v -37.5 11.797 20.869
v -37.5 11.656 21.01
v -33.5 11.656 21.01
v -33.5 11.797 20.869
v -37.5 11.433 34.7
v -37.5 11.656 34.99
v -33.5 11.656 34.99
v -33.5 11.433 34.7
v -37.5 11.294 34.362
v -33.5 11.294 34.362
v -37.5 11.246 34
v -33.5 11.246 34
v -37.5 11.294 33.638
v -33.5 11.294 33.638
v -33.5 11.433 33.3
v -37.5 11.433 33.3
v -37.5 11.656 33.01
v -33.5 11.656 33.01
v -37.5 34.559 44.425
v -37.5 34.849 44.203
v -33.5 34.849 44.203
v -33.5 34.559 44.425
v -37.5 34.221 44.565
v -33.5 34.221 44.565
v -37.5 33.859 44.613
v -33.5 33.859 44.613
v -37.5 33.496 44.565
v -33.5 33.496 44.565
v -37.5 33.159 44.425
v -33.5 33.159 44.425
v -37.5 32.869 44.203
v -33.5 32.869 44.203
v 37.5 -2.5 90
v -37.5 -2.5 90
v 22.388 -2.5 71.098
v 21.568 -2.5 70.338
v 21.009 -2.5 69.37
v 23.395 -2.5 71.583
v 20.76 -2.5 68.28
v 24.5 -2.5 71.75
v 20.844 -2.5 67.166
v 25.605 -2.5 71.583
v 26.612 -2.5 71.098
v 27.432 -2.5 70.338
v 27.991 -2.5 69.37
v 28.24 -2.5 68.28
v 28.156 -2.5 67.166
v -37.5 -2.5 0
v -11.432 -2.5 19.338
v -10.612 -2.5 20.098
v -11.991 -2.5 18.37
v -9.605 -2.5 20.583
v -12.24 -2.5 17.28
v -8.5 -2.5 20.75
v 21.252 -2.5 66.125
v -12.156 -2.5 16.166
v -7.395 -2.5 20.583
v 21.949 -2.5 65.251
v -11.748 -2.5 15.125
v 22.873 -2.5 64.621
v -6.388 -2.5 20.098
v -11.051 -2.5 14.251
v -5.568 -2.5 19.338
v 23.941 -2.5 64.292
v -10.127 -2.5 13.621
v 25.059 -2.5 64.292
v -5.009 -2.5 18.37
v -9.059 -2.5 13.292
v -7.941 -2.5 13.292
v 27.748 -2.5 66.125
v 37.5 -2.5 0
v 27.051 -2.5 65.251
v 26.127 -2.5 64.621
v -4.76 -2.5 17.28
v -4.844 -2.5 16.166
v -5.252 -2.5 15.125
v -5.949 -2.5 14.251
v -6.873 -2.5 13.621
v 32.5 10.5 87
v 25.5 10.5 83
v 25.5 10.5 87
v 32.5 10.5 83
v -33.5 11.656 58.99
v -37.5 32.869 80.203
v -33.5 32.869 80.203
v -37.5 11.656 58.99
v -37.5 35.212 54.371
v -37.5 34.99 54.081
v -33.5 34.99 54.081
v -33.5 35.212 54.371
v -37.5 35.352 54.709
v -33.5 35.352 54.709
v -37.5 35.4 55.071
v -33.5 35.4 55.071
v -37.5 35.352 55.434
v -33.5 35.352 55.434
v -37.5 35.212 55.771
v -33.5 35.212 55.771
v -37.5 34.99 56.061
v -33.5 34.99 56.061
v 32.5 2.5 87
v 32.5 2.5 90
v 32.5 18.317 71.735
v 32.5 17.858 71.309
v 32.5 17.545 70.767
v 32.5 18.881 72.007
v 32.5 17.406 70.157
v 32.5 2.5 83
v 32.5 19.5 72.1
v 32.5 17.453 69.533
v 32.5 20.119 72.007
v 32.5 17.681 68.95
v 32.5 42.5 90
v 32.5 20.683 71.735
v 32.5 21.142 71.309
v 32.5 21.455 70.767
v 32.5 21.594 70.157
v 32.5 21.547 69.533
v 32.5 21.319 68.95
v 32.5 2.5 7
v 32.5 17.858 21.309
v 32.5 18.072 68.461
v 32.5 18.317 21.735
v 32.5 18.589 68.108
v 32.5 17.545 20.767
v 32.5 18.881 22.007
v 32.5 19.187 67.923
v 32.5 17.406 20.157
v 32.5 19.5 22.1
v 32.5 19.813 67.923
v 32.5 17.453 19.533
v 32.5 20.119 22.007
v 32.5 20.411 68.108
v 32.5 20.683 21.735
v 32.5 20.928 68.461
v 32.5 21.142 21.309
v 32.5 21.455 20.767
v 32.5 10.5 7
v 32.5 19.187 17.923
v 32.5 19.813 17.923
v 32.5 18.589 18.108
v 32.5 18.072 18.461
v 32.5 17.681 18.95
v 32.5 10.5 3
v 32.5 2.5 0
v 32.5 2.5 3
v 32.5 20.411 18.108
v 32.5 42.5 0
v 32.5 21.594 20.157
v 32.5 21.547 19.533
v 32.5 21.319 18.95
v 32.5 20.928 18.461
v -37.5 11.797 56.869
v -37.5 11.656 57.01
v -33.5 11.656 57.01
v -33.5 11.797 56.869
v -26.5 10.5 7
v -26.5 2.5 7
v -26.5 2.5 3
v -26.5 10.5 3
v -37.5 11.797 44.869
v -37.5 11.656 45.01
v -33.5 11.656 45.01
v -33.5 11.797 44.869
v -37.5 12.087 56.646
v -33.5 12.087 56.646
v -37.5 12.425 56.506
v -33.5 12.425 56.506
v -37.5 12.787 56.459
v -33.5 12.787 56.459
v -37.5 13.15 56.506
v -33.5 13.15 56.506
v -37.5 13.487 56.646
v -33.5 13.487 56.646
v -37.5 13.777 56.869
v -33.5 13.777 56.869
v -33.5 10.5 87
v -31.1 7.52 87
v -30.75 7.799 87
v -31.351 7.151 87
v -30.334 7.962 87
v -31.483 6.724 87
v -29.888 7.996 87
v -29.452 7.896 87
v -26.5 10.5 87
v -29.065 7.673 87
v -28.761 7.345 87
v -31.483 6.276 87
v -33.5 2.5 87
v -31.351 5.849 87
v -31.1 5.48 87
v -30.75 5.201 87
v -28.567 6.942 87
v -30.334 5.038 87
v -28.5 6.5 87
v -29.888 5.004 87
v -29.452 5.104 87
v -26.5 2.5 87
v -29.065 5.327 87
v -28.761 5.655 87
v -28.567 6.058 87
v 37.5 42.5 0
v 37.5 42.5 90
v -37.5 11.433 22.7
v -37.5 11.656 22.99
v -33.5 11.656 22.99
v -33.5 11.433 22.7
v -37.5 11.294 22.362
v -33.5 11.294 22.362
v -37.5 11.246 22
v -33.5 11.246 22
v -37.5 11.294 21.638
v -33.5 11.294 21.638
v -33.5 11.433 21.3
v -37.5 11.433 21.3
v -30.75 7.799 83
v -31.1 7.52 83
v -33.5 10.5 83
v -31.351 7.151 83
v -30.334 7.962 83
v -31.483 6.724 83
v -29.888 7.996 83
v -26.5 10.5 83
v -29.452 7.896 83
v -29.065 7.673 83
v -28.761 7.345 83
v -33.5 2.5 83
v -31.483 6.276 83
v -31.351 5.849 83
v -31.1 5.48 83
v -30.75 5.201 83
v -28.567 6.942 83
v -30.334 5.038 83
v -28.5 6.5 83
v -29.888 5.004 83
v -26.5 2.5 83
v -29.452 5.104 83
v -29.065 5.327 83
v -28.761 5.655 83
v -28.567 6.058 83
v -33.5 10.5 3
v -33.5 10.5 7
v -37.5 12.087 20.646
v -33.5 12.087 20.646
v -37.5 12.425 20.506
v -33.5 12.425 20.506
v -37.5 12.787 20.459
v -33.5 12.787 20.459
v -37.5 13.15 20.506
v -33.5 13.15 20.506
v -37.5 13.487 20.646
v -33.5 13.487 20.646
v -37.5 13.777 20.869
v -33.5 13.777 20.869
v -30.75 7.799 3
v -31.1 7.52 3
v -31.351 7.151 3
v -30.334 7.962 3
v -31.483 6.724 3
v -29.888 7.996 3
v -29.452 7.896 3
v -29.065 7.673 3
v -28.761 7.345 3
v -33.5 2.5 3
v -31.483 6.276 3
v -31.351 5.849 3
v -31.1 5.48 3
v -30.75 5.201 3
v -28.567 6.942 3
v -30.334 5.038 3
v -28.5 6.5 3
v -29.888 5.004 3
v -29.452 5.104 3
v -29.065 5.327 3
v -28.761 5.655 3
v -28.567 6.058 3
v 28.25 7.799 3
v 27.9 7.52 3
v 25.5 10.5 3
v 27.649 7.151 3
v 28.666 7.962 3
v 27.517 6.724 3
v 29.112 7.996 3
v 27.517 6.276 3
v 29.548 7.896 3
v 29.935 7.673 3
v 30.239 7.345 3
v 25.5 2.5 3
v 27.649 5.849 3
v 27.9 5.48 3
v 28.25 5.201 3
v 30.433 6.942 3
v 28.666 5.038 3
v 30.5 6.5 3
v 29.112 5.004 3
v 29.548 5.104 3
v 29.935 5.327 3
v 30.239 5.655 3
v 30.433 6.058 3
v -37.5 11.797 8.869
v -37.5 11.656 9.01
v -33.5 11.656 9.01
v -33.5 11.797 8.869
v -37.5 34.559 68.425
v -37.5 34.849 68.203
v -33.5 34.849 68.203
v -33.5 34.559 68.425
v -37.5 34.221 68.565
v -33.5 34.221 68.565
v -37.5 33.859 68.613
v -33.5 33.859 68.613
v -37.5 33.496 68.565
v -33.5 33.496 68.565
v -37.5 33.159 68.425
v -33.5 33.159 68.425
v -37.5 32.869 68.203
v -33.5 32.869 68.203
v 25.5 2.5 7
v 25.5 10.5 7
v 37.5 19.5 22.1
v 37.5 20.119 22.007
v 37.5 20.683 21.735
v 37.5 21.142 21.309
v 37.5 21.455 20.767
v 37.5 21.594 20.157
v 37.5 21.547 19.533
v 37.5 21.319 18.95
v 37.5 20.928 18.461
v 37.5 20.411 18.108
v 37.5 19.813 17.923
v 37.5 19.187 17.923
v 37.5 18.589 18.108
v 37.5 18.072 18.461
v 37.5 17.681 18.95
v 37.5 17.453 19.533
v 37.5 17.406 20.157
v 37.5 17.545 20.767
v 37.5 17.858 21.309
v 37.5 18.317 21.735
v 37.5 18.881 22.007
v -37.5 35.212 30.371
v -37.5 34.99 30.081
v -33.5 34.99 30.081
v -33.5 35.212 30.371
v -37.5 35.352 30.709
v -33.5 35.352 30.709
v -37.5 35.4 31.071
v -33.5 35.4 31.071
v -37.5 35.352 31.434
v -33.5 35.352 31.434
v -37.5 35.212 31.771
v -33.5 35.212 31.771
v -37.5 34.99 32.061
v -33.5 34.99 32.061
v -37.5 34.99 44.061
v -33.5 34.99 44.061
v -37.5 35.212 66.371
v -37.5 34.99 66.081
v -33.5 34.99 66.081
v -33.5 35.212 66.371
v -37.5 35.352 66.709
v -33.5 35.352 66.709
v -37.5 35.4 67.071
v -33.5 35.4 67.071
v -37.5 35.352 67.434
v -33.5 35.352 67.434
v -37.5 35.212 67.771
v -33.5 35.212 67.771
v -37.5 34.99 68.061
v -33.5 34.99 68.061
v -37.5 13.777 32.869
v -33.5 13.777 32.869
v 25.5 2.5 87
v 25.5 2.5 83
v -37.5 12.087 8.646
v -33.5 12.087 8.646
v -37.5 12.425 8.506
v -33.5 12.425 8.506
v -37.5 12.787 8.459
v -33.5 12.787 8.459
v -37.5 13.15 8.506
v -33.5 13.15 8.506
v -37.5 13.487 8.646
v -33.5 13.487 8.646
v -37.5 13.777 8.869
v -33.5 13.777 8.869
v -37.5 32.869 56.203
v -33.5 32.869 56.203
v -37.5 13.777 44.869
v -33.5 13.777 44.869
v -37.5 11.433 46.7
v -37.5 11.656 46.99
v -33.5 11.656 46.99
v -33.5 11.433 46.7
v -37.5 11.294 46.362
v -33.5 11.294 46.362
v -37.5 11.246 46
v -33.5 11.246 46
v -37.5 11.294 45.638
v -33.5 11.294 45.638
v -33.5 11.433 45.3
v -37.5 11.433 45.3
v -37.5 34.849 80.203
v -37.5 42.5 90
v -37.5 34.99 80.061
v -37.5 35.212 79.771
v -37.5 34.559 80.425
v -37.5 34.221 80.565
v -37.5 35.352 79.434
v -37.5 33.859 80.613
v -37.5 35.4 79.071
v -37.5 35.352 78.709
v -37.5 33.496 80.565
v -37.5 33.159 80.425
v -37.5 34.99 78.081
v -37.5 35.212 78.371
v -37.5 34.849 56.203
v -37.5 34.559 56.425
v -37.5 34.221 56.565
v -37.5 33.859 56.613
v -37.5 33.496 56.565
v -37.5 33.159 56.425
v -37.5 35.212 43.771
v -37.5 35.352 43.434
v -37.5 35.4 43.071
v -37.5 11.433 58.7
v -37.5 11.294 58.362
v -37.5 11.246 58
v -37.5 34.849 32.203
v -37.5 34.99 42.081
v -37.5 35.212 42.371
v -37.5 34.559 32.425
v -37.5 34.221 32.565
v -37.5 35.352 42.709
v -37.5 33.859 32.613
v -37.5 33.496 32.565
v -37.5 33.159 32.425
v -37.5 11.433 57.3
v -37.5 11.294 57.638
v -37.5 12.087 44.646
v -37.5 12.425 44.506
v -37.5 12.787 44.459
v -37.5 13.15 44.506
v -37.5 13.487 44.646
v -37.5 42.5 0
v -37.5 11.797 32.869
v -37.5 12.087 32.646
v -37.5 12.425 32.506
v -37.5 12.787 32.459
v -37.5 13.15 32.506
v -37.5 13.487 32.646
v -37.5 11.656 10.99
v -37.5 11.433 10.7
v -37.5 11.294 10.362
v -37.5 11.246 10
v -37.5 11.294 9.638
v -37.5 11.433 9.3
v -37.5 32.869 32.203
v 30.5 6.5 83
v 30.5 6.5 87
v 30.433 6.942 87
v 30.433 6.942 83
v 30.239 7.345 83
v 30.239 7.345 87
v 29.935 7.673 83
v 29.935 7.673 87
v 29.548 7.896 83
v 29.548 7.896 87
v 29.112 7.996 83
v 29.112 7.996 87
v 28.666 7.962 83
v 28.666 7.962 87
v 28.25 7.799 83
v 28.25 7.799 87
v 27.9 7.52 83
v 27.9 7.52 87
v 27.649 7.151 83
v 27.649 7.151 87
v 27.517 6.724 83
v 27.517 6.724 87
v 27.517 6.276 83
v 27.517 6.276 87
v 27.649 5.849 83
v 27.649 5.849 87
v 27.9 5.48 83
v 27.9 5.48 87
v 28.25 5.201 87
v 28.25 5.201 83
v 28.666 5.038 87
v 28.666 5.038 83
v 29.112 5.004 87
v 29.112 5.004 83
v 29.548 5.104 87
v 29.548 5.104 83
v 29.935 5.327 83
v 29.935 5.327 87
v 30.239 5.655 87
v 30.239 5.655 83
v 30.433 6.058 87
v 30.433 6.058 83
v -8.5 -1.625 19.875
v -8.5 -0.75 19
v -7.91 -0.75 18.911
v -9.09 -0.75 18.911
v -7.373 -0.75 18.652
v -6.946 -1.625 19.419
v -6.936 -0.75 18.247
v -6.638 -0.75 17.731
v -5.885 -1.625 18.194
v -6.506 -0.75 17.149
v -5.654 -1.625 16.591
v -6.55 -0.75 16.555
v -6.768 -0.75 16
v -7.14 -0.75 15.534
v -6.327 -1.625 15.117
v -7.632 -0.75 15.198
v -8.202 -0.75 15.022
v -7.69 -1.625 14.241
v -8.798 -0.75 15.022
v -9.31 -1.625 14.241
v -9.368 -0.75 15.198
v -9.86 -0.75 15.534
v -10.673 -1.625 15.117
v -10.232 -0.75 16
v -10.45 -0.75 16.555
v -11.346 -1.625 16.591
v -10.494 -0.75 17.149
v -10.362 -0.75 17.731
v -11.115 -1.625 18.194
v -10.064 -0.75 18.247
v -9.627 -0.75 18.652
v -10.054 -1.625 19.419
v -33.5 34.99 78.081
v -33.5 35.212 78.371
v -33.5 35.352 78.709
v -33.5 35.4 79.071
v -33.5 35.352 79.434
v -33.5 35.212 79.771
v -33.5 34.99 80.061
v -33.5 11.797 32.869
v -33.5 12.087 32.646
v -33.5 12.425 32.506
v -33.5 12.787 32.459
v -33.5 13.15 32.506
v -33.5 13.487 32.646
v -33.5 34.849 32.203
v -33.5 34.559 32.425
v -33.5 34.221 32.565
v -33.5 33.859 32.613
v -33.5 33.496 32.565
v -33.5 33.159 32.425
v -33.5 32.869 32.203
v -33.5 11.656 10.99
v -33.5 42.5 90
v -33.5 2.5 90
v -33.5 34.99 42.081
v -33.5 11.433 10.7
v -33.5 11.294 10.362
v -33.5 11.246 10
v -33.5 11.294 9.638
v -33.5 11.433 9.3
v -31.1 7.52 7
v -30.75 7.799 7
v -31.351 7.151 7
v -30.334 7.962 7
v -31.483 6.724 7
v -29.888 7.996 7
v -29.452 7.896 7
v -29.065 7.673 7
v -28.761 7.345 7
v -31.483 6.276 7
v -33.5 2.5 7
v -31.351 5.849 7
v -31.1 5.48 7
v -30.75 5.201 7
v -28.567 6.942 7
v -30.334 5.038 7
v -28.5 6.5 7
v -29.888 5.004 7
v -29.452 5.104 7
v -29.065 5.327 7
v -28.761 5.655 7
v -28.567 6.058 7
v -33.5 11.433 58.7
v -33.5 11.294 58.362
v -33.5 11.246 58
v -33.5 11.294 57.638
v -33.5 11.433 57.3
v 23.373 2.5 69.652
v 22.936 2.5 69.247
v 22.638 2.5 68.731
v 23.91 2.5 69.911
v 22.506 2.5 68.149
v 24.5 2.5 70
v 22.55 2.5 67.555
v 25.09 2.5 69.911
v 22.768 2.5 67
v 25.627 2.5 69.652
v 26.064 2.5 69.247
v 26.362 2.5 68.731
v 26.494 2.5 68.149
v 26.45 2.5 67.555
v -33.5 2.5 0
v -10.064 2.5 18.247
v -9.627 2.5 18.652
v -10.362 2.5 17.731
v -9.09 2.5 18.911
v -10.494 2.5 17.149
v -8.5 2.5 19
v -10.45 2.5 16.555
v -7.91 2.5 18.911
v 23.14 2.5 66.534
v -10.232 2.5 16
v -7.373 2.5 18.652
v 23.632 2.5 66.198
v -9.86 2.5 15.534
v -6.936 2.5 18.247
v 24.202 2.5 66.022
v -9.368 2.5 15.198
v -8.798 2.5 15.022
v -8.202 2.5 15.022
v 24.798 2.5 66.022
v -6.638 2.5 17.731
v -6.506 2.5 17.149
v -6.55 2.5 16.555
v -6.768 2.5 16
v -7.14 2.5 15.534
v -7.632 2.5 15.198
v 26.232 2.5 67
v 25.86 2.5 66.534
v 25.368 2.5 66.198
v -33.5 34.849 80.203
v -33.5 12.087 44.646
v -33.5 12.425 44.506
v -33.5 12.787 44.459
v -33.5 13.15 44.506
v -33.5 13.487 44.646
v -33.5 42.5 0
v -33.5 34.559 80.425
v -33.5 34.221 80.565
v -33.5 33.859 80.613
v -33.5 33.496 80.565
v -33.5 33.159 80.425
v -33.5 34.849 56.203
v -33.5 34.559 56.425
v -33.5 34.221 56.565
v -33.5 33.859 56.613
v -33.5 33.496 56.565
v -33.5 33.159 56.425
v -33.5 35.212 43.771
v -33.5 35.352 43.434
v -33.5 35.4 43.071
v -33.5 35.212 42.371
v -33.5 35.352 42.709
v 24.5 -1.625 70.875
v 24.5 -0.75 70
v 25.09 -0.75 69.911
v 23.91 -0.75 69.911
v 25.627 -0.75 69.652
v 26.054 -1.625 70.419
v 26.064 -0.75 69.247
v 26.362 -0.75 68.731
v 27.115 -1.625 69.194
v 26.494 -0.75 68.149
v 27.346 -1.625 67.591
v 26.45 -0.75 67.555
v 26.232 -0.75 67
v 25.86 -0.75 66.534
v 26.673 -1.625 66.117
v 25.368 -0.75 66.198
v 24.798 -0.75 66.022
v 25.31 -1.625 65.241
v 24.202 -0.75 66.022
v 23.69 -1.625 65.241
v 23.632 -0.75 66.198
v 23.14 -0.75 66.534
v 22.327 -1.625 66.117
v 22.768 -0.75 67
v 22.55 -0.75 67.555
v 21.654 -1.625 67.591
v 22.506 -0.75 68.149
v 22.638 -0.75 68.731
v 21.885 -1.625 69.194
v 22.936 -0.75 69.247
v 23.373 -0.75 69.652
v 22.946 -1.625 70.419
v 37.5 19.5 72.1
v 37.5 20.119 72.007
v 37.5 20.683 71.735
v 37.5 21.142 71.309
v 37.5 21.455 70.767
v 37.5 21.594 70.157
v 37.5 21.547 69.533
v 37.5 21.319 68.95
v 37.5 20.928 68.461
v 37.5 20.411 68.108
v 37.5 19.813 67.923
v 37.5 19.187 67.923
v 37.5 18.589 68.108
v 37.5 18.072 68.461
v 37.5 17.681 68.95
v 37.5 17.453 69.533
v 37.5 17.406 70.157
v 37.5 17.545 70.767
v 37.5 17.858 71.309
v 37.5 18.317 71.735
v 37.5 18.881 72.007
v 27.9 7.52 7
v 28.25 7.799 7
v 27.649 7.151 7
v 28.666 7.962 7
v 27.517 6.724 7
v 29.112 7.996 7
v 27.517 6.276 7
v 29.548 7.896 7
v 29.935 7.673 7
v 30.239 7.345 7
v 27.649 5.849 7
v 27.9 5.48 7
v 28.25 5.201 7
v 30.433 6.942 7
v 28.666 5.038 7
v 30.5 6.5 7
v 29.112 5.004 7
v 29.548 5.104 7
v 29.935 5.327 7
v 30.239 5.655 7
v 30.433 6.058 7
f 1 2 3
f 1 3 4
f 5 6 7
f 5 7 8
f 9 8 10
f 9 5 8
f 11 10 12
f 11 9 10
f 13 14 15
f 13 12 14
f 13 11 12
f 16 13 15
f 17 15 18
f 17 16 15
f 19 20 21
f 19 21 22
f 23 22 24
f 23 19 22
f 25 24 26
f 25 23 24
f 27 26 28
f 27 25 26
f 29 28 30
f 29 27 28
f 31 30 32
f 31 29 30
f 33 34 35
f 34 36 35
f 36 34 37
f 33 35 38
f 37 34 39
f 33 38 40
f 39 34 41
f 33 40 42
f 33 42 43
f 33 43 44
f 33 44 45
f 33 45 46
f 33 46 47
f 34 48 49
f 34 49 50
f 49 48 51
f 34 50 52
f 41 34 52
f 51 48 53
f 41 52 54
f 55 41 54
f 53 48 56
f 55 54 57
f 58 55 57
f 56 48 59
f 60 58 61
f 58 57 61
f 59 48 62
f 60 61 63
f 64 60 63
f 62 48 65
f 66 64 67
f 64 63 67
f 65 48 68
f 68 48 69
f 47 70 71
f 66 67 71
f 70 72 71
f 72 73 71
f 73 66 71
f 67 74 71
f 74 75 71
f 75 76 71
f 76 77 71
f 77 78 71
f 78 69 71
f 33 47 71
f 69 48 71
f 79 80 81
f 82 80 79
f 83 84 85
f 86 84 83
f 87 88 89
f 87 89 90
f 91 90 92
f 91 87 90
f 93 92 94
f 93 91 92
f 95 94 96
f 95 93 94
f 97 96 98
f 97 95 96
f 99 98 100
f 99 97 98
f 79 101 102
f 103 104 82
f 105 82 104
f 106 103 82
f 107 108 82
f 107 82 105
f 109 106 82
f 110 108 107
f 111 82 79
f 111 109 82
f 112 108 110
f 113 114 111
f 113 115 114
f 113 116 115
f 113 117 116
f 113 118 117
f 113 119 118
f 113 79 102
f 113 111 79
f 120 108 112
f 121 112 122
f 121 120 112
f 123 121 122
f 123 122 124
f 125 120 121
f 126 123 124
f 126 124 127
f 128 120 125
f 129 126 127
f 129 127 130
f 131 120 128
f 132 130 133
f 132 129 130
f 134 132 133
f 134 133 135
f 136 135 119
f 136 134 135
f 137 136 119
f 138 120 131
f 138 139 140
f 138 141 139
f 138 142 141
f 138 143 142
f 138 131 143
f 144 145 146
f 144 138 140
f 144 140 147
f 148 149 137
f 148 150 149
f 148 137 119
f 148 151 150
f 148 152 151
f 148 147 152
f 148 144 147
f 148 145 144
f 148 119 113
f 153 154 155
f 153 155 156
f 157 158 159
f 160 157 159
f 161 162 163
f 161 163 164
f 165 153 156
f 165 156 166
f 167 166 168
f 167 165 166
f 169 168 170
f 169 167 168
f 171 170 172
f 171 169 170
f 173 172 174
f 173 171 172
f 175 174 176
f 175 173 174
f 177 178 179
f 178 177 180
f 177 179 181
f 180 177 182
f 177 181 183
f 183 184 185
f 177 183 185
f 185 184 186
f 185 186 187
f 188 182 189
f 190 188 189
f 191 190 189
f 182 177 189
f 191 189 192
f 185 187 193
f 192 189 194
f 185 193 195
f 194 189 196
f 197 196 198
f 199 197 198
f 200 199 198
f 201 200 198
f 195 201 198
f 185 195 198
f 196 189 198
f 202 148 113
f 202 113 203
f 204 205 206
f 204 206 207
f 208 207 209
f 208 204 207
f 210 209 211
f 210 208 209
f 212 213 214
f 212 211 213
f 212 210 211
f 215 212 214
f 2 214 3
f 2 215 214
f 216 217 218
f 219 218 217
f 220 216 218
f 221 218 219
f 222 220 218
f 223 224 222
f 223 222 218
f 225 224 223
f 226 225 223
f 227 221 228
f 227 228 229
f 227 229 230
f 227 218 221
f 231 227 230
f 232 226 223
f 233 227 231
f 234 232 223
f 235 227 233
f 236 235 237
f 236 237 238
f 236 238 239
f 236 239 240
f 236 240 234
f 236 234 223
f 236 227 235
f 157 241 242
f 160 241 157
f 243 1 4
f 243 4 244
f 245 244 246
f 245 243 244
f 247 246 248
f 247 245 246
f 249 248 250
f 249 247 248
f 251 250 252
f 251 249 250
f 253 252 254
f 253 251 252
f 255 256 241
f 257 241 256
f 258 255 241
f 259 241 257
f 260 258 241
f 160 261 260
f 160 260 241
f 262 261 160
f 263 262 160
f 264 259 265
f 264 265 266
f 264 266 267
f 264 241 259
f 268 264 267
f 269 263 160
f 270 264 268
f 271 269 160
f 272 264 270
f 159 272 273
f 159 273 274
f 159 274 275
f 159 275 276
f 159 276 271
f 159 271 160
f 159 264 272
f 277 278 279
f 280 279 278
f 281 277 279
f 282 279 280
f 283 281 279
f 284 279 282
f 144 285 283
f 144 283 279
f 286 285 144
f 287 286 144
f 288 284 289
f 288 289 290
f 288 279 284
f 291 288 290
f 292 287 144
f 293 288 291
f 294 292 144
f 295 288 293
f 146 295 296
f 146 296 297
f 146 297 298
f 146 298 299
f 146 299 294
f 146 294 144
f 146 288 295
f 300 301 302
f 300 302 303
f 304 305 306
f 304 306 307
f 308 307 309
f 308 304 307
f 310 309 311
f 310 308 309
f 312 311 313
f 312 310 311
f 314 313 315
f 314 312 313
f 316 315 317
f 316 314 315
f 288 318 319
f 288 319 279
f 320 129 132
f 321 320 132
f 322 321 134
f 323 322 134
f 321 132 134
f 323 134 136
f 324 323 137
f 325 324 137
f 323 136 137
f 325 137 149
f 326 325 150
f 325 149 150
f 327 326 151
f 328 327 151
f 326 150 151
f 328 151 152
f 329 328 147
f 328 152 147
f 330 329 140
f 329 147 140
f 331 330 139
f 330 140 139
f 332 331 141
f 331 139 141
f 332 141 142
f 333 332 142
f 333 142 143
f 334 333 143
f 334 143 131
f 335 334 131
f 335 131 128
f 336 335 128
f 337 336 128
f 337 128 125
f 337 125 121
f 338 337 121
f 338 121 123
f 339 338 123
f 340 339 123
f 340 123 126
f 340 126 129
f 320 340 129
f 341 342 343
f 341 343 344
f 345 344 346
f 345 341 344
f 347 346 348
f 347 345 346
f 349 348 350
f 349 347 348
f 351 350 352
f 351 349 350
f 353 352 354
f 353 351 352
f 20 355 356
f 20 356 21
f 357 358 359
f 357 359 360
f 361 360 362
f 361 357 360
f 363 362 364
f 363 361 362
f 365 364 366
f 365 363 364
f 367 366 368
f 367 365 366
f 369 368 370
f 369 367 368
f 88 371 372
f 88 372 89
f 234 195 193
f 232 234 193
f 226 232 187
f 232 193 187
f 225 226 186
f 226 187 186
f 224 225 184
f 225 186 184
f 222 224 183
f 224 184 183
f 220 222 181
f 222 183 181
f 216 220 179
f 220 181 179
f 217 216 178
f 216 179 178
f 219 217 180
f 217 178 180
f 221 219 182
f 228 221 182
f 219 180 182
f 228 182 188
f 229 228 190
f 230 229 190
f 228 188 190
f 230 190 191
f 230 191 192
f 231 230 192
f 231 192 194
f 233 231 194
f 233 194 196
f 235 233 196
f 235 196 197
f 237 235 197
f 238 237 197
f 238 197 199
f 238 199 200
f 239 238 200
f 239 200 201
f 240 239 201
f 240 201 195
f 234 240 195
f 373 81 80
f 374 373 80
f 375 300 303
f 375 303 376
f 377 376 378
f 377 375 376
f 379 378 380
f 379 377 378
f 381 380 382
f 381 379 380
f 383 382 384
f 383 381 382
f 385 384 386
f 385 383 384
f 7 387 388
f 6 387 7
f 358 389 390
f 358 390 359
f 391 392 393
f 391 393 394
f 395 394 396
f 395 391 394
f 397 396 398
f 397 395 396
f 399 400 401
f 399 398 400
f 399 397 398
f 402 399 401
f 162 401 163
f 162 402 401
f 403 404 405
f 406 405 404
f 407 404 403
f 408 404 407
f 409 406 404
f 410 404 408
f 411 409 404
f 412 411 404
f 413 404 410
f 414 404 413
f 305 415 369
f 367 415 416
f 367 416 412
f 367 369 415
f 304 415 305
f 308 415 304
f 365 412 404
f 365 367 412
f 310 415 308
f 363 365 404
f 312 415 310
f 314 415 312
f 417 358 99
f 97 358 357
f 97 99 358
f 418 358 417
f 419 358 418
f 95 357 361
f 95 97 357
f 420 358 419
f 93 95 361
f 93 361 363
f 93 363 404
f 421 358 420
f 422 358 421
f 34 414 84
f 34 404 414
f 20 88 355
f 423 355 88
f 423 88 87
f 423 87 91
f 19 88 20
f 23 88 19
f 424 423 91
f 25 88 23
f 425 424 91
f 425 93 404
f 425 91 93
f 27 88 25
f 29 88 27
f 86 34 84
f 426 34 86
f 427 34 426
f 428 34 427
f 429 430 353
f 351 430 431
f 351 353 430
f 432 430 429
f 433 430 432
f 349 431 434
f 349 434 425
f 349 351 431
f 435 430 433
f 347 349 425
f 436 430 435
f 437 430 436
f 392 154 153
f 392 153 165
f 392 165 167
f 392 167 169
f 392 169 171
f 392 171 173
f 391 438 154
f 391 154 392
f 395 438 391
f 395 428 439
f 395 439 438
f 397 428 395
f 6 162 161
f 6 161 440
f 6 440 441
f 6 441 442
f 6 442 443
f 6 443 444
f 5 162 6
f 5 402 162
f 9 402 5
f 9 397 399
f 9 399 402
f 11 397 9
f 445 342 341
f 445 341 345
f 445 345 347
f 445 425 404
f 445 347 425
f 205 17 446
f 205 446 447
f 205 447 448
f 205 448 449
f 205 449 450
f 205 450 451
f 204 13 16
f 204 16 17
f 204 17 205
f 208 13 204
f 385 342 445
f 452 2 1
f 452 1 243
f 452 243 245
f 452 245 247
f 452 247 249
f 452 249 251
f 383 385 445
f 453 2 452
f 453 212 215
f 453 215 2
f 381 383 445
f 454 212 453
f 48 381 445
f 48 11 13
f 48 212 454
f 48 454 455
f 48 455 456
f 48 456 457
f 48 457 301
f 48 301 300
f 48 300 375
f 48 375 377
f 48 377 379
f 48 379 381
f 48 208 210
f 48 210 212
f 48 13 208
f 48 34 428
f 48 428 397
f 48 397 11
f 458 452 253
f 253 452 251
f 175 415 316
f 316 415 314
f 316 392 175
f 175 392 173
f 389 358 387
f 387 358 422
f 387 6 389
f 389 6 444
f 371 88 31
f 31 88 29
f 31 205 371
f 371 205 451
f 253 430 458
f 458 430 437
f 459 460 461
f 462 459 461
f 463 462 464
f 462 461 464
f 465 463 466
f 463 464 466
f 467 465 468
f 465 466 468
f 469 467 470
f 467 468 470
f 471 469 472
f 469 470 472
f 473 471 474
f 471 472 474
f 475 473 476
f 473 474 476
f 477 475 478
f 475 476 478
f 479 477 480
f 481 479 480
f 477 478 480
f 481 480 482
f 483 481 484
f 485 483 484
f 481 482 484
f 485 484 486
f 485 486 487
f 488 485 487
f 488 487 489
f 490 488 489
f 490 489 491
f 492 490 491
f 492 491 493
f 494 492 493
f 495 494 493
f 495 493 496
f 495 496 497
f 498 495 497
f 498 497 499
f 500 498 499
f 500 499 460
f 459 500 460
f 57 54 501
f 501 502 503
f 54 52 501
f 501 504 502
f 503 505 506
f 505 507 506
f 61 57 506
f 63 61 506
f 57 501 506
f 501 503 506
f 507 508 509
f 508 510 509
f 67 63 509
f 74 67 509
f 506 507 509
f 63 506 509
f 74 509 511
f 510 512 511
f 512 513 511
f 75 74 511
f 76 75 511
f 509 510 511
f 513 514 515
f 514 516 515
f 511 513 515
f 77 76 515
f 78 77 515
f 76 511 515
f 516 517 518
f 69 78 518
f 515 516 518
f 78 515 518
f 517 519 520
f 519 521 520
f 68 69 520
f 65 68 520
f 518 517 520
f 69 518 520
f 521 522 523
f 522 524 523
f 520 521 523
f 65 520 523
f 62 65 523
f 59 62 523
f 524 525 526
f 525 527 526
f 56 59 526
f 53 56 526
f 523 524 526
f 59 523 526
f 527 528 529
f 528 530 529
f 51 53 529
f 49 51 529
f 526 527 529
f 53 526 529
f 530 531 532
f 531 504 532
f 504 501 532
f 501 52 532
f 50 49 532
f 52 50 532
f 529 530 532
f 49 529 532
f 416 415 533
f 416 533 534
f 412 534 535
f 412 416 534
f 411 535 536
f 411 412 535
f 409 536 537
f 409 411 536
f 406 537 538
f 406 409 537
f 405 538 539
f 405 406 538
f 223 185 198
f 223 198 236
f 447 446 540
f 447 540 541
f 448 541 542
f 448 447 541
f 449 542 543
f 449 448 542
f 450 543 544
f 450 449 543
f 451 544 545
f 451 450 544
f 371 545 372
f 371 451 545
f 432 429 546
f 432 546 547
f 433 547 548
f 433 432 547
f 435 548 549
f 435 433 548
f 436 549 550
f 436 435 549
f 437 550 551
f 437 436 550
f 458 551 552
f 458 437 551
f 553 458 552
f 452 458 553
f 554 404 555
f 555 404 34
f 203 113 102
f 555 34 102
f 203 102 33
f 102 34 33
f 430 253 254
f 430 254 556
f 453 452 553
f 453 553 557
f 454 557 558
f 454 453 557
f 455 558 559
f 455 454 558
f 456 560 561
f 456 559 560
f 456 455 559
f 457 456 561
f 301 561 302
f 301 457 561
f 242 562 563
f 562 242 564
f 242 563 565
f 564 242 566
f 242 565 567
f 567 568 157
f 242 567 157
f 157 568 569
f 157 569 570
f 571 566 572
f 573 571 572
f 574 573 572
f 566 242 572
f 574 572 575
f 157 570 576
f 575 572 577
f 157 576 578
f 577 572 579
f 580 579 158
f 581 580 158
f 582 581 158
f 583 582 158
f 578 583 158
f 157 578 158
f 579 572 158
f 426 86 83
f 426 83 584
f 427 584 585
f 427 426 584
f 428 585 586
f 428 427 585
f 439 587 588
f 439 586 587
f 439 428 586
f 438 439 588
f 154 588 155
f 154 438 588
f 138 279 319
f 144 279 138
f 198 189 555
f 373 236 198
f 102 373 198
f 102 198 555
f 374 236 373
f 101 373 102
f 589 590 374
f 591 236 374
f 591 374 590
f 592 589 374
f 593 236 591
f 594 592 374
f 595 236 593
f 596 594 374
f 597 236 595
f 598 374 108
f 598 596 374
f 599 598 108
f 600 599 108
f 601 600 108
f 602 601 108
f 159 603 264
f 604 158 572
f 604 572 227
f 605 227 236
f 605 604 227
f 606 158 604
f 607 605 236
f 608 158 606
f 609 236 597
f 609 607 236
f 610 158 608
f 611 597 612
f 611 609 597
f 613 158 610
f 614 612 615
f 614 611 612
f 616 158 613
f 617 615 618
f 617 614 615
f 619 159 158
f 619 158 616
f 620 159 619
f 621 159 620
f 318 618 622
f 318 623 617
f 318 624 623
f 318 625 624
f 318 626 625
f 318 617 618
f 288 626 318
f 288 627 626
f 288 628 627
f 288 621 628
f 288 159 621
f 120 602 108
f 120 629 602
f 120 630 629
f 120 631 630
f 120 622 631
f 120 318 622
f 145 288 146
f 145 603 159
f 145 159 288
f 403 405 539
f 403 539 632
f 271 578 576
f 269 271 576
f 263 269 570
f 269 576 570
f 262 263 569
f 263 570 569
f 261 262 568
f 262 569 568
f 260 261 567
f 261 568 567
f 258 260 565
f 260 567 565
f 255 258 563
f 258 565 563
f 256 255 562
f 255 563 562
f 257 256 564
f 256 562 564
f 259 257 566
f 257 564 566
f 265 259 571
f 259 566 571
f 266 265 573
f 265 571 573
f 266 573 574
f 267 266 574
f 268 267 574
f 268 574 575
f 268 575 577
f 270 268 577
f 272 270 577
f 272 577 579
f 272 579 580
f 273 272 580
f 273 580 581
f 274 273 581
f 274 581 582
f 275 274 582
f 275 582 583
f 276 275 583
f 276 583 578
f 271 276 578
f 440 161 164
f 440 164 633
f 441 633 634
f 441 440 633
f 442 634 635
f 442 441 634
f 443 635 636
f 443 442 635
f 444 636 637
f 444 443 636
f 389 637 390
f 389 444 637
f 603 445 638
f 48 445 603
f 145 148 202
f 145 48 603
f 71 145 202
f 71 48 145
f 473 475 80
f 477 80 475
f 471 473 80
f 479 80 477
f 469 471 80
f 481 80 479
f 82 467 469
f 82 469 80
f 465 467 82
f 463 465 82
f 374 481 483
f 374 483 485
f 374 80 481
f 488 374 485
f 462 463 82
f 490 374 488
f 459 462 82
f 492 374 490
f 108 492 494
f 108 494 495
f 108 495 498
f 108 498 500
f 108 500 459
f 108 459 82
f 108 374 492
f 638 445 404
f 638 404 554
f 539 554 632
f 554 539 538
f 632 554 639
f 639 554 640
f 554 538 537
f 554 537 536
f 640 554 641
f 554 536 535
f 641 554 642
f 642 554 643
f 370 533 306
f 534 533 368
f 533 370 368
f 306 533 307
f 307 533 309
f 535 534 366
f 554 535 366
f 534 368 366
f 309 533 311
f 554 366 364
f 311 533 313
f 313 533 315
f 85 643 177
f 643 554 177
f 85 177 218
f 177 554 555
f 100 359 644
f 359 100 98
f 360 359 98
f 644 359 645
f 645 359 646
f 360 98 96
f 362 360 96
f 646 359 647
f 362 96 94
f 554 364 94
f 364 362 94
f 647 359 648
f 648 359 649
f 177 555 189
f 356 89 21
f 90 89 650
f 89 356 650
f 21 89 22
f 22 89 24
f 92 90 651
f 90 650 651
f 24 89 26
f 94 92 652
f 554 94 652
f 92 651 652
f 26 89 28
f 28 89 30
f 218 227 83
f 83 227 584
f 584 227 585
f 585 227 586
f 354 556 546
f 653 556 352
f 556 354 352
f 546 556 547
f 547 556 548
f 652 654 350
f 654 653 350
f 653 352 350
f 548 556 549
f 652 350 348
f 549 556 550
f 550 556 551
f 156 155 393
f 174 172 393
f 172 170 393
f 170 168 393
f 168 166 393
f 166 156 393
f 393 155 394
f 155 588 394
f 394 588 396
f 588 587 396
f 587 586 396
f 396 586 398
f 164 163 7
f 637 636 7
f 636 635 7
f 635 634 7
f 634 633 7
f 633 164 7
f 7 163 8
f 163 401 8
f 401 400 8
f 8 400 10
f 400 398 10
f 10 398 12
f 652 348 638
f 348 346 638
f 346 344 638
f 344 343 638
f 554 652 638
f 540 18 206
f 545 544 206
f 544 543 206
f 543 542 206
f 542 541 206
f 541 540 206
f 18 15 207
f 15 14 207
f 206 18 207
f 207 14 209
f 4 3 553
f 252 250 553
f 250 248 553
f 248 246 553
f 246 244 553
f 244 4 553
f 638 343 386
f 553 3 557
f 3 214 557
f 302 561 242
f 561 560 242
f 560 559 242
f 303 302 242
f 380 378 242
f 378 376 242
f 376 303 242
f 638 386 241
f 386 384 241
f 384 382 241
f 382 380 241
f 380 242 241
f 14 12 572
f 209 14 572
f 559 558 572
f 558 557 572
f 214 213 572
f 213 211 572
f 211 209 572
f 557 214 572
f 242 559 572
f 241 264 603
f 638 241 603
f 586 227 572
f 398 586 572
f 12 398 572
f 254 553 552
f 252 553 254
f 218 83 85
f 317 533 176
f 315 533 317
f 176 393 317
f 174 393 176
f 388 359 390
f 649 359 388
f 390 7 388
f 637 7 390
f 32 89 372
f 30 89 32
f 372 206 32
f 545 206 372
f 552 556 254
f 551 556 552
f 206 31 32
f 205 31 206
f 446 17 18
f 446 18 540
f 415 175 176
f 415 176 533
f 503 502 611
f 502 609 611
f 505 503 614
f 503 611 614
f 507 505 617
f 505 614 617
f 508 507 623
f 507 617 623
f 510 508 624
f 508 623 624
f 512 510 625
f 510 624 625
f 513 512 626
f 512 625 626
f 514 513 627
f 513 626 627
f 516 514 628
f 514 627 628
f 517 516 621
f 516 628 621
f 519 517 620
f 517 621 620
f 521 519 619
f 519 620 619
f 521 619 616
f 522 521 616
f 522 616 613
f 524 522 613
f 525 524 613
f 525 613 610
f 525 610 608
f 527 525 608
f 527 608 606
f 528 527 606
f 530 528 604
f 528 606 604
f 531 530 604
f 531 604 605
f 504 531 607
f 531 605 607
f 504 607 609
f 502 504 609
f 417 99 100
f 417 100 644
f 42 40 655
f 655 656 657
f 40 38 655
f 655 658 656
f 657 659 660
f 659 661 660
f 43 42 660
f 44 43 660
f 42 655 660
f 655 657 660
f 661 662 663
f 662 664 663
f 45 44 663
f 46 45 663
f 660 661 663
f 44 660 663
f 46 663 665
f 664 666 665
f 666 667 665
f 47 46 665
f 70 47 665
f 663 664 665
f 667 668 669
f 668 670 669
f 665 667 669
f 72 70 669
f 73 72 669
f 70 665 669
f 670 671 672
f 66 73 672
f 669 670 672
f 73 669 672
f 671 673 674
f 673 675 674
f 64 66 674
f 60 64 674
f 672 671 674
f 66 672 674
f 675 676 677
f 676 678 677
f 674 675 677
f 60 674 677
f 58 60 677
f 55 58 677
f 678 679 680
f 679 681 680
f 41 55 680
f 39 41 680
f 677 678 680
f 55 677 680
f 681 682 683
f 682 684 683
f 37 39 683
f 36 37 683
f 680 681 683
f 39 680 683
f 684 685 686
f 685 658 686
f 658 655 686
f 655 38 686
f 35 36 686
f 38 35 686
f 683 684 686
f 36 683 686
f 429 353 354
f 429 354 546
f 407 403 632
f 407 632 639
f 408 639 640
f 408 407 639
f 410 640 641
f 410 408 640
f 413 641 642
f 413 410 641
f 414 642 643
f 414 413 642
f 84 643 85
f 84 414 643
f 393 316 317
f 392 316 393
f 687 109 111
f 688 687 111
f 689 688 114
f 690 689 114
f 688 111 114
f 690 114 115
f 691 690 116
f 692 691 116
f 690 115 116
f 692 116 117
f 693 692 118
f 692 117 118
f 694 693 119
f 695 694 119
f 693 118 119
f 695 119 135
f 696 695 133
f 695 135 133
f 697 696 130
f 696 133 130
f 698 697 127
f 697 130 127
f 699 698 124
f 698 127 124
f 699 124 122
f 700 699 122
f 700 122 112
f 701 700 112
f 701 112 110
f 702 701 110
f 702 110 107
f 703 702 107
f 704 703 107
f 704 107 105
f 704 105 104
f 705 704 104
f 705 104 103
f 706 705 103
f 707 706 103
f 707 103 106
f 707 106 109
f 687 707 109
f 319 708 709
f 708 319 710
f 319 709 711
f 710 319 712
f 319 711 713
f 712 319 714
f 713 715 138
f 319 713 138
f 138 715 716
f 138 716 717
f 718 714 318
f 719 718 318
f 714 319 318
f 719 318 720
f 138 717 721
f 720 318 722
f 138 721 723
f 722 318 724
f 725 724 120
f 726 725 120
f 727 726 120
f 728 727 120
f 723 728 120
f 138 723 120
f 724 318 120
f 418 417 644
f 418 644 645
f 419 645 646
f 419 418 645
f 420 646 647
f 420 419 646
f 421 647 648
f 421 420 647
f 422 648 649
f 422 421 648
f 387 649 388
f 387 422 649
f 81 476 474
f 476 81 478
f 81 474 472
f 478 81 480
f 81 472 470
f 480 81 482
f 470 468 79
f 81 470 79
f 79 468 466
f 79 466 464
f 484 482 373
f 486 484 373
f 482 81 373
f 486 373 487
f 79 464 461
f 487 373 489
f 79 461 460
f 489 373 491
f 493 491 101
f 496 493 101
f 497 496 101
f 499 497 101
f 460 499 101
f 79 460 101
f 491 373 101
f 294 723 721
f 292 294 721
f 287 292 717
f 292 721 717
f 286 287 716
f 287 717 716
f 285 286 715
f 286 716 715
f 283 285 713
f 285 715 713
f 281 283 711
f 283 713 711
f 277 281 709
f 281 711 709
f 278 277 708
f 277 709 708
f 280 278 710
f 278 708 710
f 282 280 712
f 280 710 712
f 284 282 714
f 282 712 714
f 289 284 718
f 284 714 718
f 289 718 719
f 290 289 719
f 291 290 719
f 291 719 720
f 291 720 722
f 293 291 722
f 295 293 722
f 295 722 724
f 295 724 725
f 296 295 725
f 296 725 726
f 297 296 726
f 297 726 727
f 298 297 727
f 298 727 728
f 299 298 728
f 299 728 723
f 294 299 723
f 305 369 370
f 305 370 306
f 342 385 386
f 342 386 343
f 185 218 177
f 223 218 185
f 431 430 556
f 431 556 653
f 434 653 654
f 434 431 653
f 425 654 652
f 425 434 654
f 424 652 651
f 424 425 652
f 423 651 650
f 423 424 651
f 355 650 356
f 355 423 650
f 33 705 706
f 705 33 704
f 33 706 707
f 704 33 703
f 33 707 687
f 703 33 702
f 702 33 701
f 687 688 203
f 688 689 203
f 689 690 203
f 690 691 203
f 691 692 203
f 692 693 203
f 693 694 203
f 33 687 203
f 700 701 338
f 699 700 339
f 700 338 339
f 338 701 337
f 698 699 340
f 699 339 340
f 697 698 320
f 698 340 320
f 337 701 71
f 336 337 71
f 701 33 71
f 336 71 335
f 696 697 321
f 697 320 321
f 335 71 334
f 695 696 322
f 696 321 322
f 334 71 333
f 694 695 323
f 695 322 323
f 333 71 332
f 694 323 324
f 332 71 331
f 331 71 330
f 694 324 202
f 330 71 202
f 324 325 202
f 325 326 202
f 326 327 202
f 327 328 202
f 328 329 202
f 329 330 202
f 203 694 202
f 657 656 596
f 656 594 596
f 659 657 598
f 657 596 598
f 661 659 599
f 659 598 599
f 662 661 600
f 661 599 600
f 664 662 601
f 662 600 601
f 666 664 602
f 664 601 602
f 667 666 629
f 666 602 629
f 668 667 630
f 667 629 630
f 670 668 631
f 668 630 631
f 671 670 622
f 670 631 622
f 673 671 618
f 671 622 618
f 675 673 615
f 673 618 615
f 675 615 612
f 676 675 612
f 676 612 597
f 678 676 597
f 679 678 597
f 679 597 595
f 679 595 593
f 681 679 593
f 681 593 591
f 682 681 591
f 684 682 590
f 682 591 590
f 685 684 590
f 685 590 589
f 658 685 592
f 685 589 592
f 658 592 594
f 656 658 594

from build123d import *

# Parameters (mm, degrees)
SKETCH1_W                                           = 75
SKETCH1_H                                           = 5
SKETCH1_W_2                                         = 5
SKETCH1_H_2                                         = 40
BOSS_EXTRUDE1_DEPTH                                 = 90
SKETCH2_R                                           = 2.1
CUT_EXTRUDE1_DEPTH                                  = 122.680935236
SKETCH4_W                                           = 4
SKETCH4_H                                           = 90
BOSS_EXTRUDE2_DEPTH                                 = 40
SKETCH6_W                                           = 7
SKETCH6_H                                           = 4
BOSS_EXTRUDE4_DEPTH                                 = 8
SKETCH7_R                                           = 1.6
CUT_EXTRUDE3_DEPTH                                  = 106.386194542
CUT_EXTRUDE4_REACH                                  = 126.624
LPATTERN1_COUNT                                     = 5
LPATTERN1_PITCH                                     = 12
SKETCH9_R                                           = 1.5
CUT_EXTRUDE5_DEPTH                                  = 104.834002138
CSK_FOR_M4_COUNTERSUNK_FLAT_HEAD_SCREW1_D           = 4
CSK_FOR_M4_COUNTERSUNK_FLAT_HEAD_SCREW1_CSINK_D     = 7.5
CSK_FOR_M4_COUNTERSUNK_FLAT_HEAD_SCREW1_CSINK_ANGLE = 90


with BuildPart() as part:
    # Sketch1 → Boss-Extrude1 (new body)
    with BuildSketch(Plane.XY):
        Rectangle(SKETCH1_W, SKETCH1_H)
        with Locations((35, 22.5)):
            Rectangle(SKETCH1_W_2, SKETCH1_H_2)
    extrude(amount=BOSS_EXTRUDE1_DEPTH)

    # Sketch2 → Cut-Extrude1 (cut, through all)
    with BuildSketch(Plane.ZY.offset(-32.5)):
        with Locations((20, 19.5)):
            Circle(SKETCH2_R)
        with Locations((70, 19.5)):
            Circle(SKETCH2_R)
    extrude(amount=-CUT_EXTRUDE1_DEPTH, mode=Mode.SUBTRACT)

    # Sketch4 → Boss-Extrude2 (add)
    with BuildSketch(Plane(origin=(0, 2.5, 0), x_dir=(1, 0, 0), z_dir=(0, 1, 0))):
        with Locations((-35.5, -45)):
            Rectangle(SKETCH4_W, SKETCH4_H)
    extrude(amount=BOSS_EXTRUDE2_DEPTH)

    # Sketch6 → Boss-Extrude4 (add)
    with BuildSketch(Plane(origin=(0, 2.5, 0), x_dir=(1, 0, 0), z_dir=(0, 1, 0))):
        with Locations((-30, -5)):
            Rectangle(SKETCH6_W, SKETCH6_H)
        with Locations((29, -5)):
            Rectangle(SKETCH6_W, SKETCH6_H)
        with Locations((29, -85)):
            Rectangle(SKETCH6_W, SKETCH6_H)
        with Locations((-30, -85)):
            Rectangle(SKETCH6_W, SKETCH6_H)
    extrude(amount=BOSS_EXTRUDE4_DEPTH)

    # Sketch7 → Cut-Extrude3 (cut, through all)
    with BuildSketch(Plane(origin=(0, 2.5, 0), x_dir=(1, 0, 0), z_dir=(0, 1, 0))):
        with Locations(Location((24.5, -68, 0), (0, 0, 180))):
            Circle(SKETCH7_R)
        with Locations(Location((-8.5, -17, 0), (0, 0, 180))):
            Circle(SKETCH7_R)
    extrude(amount=-CUT_EXTRUDE3_DEPTH, mode=Mode.SUBTRACT)

    # Sketch8 → Cut-Extrude4 (cut, up to next)
    with BuildSketch(Plane.ZY.offset(37.5), mode=Mode.PRIVATE) as cut_extrude4_sk1:
        with BuildLine():
            Line((32.061260163, 34.989949494), (32.202681519, 34.848528137))
            ThreePointArc((32.202681519, 34.848528137), (32.612732026, 33.858578644), (32.202681519, 32.86862915))
            Line((32.202681519, 32.86862915), (10.989949494, 11.655897124))
            ThreePointArc((10.989949494, 11.655897124), (10, 11.245846618), (9.010050506, 11.655897124))
            Line((9.010050506, 11.655897124), (8.86862915, 11.797318481))
            ThreePointArc((8.86862915, 11.797318481), (8.458578644, 12.787267974), (8.86862915, 13.777217468))
            Line((8.86862915, 13.777217468), (30.081361176, 34.989949494))
            ThreePointArc((30.081361176, 34.989949494), (31.07131067, 35.4), (32.061260163, 34.989949494))
        make_face()
    cut_extrude4_tool1 = extrude(cut_extrude4_sk1.sketch, amount=-CUT_EXTRUDE4_REACH, mode=Mode.PRIVATE) & part.part
    cut_extrude4 = cut_extrude4_tool1.solids().sort_by_distance((-37.5, 23.322923, 20.535655))[0]
    add(cut_extrude4, mode=Mode.SUBTRACT)

    # LPattern1: Cut-Extrude4 ×5
    with Locations(*[(0, 0, i * LPATTERN1_PITCH) for i in range(1, LPATTERN1_COUNT)]):
        add(cut_extrude4, mode=Mode.SUBTRACT)

    # Sketch9 → Cut-Extrude5 (cut, through all)
    with BuildSketch(Plane.XY.offset(87)):
        with Locations((-30, 6.5)):
            Circle(SKETCH9_R)
        with Locations((29, 6.5)):
            Circle(SKETCH9_R)
    extrude(amount=-CUT_EXTRUDE5_DEPTH, mode=Mode.SUBTRACT)

    # CSK for M4 Countersunk Flat Head Screw1 (through all)
    with Locations(Plane(origin=(24.5, -2.5, 68), x_dir=(0, 0, -1), z_dir=(0, -1, 0))):
        with Locations((0, 0), (51, -33)):
            CounterSinkHole(CSK_FOR_M4_COUNTERSUNK_FLAT_HEAD_SCREW1_D / 2, CSK_FOR_M4_COUNTERSUNK_FLAT_HEAD_SCREW1_CSINK_D / 2, counter_sink_angle=CSK_FOR_M4_COUNTERSUNK_FLAT_HEAD_SCREW1_CSINK_ANGLE)


solid = part.part
